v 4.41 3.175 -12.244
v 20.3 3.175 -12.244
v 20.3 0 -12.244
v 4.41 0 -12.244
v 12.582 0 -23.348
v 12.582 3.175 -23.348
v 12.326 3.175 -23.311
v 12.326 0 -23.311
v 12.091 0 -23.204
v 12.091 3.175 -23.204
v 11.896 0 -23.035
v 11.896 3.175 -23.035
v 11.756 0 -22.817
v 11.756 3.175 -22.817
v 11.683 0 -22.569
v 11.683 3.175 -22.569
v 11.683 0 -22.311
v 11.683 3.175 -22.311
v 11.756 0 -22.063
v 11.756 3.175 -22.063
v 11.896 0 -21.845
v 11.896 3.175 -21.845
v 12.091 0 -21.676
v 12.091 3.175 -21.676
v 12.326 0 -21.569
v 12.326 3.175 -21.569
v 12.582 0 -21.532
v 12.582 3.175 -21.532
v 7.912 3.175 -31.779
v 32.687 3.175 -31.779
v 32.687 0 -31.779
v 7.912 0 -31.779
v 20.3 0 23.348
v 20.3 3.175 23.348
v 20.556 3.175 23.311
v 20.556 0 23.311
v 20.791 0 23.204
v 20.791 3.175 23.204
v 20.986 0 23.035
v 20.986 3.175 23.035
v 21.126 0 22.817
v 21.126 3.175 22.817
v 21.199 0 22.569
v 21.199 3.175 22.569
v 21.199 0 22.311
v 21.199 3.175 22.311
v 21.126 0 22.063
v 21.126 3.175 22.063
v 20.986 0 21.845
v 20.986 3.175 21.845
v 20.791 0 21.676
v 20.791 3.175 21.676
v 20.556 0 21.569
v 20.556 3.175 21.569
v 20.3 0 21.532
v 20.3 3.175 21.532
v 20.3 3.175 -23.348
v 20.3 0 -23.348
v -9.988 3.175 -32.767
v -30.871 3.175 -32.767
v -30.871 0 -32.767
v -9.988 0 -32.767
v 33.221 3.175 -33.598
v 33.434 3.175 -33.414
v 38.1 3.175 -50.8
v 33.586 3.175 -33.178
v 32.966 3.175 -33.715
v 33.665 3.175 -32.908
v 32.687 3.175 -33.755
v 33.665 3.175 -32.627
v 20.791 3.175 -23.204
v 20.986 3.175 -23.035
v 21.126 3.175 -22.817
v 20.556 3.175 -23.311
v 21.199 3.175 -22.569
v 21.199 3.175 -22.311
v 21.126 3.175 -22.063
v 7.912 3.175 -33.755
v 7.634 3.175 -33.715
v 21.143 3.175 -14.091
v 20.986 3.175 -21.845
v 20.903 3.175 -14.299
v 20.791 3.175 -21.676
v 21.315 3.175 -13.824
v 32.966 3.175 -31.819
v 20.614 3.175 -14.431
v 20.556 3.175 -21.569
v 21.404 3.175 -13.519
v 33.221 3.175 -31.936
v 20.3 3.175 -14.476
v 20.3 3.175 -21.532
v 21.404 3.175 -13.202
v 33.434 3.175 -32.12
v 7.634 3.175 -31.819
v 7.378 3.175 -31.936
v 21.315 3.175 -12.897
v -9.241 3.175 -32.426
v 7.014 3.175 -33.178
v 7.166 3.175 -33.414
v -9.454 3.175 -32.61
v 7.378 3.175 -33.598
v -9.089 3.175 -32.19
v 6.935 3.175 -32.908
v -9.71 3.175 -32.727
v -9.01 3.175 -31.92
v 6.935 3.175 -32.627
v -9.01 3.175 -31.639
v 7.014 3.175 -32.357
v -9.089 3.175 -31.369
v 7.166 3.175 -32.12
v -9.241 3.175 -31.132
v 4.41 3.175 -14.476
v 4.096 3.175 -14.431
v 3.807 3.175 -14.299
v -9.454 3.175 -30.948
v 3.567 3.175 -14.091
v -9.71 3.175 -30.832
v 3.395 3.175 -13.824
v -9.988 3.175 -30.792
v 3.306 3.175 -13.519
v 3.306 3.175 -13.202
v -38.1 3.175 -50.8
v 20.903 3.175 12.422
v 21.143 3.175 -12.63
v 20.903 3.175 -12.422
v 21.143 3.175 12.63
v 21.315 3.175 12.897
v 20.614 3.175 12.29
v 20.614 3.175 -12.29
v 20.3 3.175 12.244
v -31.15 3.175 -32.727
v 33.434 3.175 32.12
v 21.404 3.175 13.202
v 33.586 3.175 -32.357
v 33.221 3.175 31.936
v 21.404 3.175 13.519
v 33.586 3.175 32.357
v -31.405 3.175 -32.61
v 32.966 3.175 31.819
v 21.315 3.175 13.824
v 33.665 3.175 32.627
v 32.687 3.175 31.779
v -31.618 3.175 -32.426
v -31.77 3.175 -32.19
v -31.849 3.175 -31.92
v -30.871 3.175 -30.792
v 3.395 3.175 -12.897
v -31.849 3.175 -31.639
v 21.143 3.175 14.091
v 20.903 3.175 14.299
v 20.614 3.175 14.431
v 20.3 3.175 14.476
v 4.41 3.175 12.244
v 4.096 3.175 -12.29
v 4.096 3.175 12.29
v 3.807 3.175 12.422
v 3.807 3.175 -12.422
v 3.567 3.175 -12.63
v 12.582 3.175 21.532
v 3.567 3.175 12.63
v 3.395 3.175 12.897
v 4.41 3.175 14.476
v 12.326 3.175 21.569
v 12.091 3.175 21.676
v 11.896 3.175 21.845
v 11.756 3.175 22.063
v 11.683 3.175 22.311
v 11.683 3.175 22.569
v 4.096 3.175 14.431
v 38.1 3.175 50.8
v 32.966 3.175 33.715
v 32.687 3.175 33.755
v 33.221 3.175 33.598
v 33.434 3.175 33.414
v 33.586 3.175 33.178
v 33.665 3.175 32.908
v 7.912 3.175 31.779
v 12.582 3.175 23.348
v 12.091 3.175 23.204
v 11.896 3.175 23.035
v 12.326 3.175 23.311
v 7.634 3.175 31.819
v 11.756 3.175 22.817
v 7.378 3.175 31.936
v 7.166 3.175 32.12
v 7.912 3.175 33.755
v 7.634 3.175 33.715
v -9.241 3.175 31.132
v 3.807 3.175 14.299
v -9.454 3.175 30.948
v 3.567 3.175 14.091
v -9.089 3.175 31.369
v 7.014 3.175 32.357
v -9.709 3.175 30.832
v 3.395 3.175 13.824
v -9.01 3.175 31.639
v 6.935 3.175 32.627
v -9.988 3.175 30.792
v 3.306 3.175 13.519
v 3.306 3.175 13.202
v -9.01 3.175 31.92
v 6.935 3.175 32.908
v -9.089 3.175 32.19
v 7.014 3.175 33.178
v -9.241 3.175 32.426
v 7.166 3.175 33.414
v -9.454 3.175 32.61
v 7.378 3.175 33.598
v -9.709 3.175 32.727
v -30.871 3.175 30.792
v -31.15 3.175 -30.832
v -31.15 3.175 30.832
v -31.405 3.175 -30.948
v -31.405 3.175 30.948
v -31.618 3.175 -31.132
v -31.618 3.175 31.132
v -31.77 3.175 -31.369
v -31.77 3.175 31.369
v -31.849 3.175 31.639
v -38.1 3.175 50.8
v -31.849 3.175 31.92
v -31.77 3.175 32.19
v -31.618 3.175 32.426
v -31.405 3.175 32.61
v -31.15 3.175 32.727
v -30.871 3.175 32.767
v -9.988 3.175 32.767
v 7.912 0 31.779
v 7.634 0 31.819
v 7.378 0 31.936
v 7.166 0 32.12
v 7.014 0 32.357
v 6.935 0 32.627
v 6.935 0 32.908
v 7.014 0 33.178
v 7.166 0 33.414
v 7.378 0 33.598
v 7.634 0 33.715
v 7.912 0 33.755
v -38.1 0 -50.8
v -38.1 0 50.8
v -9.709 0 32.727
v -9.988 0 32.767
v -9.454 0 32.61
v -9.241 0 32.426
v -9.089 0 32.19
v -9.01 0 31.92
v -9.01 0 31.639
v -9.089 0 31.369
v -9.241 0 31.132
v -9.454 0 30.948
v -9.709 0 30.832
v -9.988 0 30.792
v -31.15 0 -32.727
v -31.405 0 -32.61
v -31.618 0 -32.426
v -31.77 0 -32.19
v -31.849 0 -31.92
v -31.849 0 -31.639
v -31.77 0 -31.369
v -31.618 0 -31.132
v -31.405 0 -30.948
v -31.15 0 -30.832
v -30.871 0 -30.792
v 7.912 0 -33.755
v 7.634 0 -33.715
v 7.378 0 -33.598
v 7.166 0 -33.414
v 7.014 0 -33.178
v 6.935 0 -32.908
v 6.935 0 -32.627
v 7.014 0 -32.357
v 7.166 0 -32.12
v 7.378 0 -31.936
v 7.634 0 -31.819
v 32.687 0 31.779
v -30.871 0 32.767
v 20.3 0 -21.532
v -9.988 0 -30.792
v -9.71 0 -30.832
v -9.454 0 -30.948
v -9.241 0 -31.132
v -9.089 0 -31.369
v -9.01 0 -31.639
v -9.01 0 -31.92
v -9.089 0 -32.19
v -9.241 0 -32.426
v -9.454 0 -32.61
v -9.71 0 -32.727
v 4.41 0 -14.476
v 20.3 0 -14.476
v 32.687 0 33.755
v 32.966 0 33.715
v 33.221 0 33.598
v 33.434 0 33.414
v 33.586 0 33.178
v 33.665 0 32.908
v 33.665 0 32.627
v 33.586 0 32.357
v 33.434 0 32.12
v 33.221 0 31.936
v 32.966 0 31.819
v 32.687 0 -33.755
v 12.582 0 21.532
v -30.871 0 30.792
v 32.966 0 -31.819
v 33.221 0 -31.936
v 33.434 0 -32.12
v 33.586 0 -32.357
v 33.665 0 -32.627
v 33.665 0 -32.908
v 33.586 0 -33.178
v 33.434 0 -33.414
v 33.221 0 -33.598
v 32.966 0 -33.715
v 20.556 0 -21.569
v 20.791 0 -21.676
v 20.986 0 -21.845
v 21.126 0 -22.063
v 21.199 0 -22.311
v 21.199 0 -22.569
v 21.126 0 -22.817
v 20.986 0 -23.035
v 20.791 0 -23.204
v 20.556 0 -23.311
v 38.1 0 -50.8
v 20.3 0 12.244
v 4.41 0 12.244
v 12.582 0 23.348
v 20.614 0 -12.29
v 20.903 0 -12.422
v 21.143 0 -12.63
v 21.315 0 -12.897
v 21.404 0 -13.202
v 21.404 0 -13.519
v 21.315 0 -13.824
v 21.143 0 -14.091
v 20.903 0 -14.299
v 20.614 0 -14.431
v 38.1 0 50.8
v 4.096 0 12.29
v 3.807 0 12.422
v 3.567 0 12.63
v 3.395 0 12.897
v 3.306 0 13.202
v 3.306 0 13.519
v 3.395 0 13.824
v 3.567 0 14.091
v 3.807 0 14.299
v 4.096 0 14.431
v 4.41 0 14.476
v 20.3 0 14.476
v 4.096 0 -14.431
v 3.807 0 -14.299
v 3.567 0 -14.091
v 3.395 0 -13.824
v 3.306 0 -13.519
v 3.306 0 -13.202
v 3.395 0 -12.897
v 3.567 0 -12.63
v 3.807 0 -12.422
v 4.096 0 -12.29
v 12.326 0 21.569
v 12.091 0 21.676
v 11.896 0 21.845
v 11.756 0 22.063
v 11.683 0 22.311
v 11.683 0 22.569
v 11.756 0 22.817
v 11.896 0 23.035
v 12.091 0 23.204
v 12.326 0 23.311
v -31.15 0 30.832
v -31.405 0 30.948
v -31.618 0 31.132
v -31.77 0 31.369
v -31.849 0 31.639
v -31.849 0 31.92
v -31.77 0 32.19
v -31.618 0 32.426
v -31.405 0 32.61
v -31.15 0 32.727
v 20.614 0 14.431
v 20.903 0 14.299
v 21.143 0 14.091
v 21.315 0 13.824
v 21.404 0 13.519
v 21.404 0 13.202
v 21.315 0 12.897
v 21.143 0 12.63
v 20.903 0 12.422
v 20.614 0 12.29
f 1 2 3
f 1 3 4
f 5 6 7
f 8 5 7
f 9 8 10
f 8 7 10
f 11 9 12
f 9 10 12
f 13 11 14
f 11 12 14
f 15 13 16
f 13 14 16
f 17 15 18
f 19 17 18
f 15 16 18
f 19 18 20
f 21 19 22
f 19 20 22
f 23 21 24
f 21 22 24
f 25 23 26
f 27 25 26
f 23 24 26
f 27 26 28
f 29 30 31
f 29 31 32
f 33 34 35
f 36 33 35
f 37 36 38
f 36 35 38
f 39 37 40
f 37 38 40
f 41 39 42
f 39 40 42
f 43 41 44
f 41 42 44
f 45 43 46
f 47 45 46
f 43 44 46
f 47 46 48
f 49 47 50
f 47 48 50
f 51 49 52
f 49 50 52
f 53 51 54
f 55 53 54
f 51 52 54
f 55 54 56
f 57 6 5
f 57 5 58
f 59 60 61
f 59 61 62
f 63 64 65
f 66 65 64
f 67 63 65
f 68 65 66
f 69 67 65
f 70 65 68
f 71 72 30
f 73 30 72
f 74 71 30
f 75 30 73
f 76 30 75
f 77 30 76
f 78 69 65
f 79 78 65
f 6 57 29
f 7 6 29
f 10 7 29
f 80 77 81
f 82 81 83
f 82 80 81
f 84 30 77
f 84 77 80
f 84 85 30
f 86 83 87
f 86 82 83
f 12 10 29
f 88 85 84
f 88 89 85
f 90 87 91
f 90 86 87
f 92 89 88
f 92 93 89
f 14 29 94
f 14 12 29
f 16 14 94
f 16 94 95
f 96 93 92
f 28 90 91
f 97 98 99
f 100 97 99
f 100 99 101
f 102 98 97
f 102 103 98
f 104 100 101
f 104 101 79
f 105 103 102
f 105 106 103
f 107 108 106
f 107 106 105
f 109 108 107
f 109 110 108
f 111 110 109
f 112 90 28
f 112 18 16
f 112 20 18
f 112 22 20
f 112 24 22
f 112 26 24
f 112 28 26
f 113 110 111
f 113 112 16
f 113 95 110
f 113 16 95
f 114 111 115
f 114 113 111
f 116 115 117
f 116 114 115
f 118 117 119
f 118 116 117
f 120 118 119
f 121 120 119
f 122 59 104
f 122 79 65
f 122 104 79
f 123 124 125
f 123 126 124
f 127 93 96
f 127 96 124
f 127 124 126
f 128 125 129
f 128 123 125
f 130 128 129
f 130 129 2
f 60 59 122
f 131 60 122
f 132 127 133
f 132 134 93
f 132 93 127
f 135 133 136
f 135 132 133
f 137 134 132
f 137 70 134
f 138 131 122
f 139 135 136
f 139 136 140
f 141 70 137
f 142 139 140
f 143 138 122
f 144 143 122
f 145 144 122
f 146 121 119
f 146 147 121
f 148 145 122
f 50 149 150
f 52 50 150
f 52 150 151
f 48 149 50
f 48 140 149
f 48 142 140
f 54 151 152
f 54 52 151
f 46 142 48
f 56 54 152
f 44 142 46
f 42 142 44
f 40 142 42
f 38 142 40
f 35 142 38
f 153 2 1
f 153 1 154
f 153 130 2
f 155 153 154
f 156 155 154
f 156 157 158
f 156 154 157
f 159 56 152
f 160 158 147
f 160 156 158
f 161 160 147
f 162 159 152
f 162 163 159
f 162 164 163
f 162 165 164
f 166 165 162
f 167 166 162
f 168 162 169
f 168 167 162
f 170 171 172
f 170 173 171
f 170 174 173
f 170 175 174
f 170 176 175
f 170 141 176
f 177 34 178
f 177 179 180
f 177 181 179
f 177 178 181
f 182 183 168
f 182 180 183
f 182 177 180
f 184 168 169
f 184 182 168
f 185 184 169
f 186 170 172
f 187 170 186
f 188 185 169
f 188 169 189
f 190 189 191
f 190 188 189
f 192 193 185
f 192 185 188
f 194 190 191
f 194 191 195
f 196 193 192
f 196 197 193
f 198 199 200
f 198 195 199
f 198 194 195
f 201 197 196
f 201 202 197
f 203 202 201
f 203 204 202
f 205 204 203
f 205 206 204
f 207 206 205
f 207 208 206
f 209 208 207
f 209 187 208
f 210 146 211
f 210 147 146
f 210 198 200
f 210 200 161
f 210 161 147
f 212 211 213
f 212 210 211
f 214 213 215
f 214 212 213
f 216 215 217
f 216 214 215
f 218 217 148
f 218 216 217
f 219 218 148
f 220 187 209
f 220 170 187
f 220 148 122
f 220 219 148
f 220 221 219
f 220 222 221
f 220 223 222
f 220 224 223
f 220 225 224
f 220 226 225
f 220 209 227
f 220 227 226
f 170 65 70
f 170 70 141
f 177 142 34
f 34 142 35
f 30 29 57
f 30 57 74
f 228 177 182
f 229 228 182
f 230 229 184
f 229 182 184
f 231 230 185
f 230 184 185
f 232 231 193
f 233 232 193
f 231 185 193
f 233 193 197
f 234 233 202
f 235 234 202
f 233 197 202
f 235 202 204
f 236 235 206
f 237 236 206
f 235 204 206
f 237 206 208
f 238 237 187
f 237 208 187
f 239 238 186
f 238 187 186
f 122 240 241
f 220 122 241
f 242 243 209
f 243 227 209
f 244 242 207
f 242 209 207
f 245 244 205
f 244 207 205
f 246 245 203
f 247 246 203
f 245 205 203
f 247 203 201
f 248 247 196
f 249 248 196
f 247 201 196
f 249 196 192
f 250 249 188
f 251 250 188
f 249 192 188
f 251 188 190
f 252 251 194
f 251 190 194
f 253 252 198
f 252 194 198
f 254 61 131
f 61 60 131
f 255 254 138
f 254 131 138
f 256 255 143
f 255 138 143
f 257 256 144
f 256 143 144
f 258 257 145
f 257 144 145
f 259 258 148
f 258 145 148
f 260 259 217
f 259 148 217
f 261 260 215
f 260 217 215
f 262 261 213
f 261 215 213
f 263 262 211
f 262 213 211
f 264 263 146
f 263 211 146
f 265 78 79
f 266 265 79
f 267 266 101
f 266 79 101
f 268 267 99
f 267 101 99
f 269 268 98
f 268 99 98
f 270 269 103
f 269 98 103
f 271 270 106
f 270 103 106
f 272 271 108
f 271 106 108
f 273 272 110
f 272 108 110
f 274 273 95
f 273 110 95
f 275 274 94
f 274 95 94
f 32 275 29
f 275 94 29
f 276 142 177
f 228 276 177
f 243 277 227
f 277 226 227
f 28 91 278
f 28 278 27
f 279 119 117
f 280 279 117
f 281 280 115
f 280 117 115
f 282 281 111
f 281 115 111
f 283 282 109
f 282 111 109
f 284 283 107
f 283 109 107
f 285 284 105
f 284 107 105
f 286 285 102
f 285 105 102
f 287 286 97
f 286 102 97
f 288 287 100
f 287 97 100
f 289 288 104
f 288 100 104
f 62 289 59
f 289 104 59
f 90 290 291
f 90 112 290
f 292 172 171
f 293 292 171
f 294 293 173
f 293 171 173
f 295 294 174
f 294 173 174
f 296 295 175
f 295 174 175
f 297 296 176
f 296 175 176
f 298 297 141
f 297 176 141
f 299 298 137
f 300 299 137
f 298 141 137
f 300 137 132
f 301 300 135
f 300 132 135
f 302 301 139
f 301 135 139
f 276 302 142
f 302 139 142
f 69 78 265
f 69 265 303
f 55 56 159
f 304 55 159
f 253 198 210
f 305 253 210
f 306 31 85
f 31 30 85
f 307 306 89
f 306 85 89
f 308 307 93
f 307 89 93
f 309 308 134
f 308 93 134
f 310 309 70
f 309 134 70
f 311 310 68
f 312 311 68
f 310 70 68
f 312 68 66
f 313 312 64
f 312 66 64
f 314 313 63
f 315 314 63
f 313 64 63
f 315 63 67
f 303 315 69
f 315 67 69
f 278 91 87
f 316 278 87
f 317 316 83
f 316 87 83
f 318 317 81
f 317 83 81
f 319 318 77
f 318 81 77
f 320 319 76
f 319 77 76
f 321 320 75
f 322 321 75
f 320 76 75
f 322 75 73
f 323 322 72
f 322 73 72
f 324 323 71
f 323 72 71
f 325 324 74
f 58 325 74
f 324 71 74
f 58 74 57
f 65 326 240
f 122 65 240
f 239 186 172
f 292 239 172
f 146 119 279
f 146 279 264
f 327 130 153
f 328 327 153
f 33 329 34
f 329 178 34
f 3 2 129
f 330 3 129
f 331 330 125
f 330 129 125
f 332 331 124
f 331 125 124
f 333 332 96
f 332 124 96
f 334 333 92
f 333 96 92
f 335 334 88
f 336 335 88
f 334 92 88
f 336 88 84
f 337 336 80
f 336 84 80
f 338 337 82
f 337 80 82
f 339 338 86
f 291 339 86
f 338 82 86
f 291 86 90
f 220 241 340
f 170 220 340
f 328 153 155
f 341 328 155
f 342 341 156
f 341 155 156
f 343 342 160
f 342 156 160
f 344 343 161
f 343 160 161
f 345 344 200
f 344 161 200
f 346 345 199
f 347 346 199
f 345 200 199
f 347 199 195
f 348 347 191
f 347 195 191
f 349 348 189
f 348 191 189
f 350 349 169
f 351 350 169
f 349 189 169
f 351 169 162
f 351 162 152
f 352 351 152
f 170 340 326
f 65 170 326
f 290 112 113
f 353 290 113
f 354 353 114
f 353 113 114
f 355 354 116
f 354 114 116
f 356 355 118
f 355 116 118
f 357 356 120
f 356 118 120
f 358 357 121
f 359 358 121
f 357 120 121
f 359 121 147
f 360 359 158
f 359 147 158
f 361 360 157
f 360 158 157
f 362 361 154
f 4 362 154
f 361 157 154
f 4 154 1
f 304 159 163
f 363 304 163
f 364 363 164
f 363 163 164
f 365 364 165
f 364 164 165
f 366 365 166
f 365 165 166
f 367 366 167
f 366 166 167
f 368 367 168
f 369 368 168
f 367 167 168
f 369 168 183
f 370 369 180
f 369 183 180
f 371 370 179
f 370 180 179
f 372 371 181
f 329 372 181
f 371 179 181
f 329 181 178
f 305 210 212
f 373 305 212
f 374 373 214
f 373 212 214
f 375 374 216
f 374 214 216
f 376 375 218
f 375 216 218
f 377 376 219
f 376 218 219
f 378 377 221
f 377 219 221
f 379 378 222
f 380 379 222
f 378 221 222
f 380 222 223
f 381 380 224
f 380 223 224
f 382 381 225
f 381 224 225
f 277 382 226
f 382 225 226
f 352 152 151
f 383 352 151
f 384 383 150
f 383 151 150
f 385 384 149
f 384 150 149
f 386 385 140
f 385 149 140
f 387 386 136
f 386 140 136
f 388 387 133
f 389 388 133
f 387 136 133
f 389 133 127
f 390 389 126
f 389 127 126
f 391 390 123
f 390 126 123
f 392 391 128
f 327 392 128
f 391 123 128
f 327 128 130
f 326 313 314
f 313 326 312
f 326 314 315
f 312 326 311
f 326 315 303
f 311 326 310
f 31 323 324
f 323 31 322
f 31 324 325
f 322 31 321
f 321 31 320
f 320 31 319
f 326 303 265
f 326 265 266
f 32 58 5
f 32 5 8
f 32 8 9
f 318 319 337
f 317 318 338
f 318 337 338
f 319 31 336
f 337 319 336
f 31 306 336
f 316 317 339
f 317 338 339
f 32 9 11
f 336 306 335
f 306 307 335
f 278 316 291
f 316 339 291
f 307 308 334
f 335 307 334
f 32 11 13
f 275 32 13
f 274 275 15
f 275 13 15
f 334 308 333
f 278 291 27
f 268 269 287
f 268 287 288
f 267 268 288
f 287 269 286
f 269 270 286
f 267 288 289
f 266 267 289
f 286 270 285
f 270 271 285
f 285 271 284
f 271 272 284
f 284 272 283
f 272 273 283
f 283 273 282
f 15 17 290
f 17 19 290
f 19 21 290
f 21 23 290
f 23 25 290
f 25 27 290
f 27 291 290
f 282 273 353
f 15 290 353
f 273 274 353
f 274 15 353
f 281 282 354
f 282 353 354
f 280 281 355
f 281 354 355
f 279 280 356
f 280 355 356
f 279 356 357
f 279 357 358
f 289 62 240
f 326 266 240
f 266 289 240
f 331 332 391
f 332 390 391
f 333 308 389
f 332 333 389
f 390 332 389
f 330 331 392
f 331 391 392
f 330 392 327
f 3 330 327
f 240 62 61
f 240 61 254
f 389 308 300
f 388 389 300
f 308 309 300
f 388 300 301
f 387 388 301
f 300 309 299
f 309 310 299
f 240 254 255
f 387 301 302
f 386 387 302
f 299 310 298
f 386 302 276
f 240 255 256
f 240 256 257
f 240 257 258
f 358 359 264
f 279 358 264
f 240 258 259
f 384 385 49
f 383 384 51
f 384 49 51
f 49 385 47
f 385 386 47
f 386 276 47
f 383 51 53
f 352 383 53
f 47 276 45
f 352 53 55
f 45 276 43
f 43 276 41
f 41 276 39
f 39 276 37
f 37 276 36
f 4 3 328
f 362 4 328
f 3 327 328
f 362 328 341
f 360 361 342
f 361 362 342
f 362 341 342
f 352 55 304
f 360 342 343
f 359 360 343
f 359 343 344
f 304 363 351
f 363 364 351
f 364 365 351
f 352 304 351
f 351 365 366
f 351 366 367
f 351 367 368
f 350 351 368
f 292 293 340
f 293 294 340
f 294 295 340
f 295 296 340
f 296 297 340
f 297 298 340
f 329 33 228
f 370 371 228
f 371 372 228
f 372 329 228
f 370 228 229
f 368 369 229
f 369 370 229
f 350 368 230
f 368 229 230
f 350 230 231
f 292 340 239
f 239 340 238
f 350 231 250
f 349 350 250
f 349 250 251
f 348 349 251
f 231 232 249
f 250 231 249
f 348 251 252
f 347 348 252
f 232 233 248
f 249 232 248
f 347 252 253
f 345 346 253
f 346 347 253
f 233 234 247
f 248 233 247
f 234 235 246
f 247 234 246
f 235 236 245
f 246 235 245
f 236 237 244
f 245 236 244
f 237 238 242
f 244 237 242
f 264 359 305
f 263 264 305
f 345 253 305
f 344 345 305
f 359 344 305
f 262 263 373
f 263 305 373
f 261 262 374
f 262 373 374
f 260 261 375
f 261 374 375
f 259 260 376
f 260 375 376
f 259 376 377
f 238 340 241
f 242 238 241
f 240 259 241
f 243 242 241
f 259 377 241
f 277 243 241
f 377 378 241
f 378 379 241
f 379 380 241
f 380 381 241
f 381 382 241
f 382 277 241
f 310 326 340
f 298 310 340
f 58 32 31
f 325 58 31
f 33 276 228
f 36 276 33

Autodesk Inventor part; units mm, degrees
ref_plane "YZ Plane" through (0, 0, 0) normal (1, 0, 0) x (0, 1, 0)
ref_plane "XZ Plane" through (0, 0, 0) normal (0, 1, 0) x (-1, 0, 0)
ref_plane "XY Plane" through (0, 0, 0) normal (0, 0, 1) x (1, 0, 0)
sketch "Sketch1" plane through (0, 0, 0) normal (0, 1, 0) x (-1, 0, 0)
  line L0 (-38.1, -50.8) -> (38.1, -50.8)
  line L1 (38.1, -50.8) -> (38.1, 50.8)
  line L2 (38.1, 50.8) -> (-38.1, 50.8)
  line L3 (-38.1, 50.8) -> (-38.1, -50.8)
  line L4 (-38.1, -50.8) -> (38.1, 50.8) construction
  line L5 (38.1, -50.8) -> (-38.1, 50.8) construction
  point P0 (0, 0)
  dimension "d0" = 101.6
  dimension "d1" = 76.2
extrude "Extrusion1" add sketch "Sketch1" along normal blind 3.175
sketch "Sketch2" plane through (0, 3.175, 0) normal (0, 1, 0) x (1, 0, 0)
  line L0 (-9.9878, -31.7793) -> (-30.8713, -31.7793) construction
  line L1 (-9.9878, -30.7915) -> (-30.8713, -30.7915)
  line L2 (-30.8713, -32.7672) -> (-9.9878, -32.7672)
  arc A0 (-9.9878, -32.7672) -> (-9.9878, -30.7915) centre (-9.9878, -31.7793) ccw
  arc A1 (-30.8713, -30.7915) -> (-30.8713, -32.7672) centre (-30.8713, -31.7793) ccw
  line L3 (7.9124, -32.7672) -> (32.6873, -32.7672) construction
  line L4 (7.9124, -33.755) -> (32.6873, -33.755)
  line L5 (32.6873, -31.7793) -> (7.9124, -31.7793)
  arc A2 (7.9124, -31.7793) -> (7.9124, -33.755) centre (7.9124, -32.7672) ccw
  arc A3 (32.6873, -33.755) -> (32.6873, -31.7793) centre (32.6873, -32.7672) ccw
  line L6 (20.2998, -22.4401) -> (12.582, -22.4401) construction
  line L7 (20.2998, -21.5321) -> (12.582, -21.5321)
  line L8 (12.582, -23.3481) -> (20.2998, -23.3481)
  arc A4 (20.2998, -23.3481) -> (20.2998, -21.5321) centre (20.2998, -22.4401) ccw
  arc A5 (12.582, -21.5321) -> (12.582, -23.3481) centre (12.582, -22.4401) ccw
  line L9 (20.2998, -13.3603) -> (4.4102, -13.3603) construction
  line L10 (20.2998, -12.2445) -> (4.4102, -12.2445)
  line L11 (4.4102, -14.4761) -> (20.2998, -14.4761)
  arc A6 (20.2998, -14.4761) -> (20.2998, -12.2445) centre (20.2998, -13.3603) ccw
  arc A7 (4.4102, -12.2445) -> (4.4102, -14.4761) centre (4.4102, -13.3603) ccw
  line L12 (-9.9878, 31.7793) -> (-30.8713, 31.7793) construction
  line L13 (-9.9878, 30.7915) -> (-30.8713, 30.7915)
  line L14 (-30.8713, 32.7672) -> (-9.9878, 32.7672)
  arc A8 (-9.9878, 30.7915) -> (-9.9878, 32.7672) centre (-9.9878, 31.7793) ccw
  arc A9 (-30.8713, 32.7672) -> (-30.8713, 30.7915) centre (-30.8713, 31.7793) ccw
  line L15 (7.9124, 32.7672) -> (32.6873, 32.7672) construction
  line L16 (7.9124, 33.755) -> (32.6873, 33.755)
  line L17 (32.6873, 31.7793) -> (7.9124, 31.7793)
  arc A10 (7.9124, 33.755) -> (7.9124, 31.7793) centre (7.9124, 32.7672) ccw
  arc A11 (32.6873, 31.7793) -> (32.6873, 33.755) centre (32.6873, 32.7672) ccw
  line L18 (20.2998, 22.4401) -> (12.582, 22.4401) construction
  line L19 (20.2998, 21.5321) -> (12.582, 21.5321)
  line L20 (12.582, 23.3481) -> (20.2998, 23.3481)
  arc A12 (20.2998, 21.5321) -> (20.2998, 23.3481) centre (20.2998, 22.4401) ccw
  arc A13 (12.582, 23.3481) -> (12.582, 21.5321) centre (12.582, 22.4401) ccw
  line L21 (20.2998, 13.3603) -> (4.4102, 13.3603) construction
  line L22 (20.2998, 12.2445) -> (4.4102, 12.2445)
  line L23 (4.4102, 14.4761) -> (20.2998, 14.4761)
  arc A14 (20.2998, 12.2445) -> (20.2998, 14.4761) centre (20.2998, 13.3603) ccw
  arc A15 (4.4102, 14.4761) -> (4.4102, 12.2445) centre (4.4102, 13.3603) ccw
  point P0 (-20.4296, -31.7793)
  point P1 (20.2998, -32.7672)
  point P2 (16.4409, -22.4401)
  point P3 (12.355, -13.3603)
  point P4 (0, -25.2547)
  point P5 (-20.4296, 31.7793)
  point P6 (20.2998, 32.7672)
  point P7 (16.4409, 22.4401)
  point P8 (12.355, 13.3603)
extrude "Extrusion2" cut sketch "Sketch2" against normal blind 3.175
properties part number "top frame 4x4" material "Nickel-Copper Alloy 400"
